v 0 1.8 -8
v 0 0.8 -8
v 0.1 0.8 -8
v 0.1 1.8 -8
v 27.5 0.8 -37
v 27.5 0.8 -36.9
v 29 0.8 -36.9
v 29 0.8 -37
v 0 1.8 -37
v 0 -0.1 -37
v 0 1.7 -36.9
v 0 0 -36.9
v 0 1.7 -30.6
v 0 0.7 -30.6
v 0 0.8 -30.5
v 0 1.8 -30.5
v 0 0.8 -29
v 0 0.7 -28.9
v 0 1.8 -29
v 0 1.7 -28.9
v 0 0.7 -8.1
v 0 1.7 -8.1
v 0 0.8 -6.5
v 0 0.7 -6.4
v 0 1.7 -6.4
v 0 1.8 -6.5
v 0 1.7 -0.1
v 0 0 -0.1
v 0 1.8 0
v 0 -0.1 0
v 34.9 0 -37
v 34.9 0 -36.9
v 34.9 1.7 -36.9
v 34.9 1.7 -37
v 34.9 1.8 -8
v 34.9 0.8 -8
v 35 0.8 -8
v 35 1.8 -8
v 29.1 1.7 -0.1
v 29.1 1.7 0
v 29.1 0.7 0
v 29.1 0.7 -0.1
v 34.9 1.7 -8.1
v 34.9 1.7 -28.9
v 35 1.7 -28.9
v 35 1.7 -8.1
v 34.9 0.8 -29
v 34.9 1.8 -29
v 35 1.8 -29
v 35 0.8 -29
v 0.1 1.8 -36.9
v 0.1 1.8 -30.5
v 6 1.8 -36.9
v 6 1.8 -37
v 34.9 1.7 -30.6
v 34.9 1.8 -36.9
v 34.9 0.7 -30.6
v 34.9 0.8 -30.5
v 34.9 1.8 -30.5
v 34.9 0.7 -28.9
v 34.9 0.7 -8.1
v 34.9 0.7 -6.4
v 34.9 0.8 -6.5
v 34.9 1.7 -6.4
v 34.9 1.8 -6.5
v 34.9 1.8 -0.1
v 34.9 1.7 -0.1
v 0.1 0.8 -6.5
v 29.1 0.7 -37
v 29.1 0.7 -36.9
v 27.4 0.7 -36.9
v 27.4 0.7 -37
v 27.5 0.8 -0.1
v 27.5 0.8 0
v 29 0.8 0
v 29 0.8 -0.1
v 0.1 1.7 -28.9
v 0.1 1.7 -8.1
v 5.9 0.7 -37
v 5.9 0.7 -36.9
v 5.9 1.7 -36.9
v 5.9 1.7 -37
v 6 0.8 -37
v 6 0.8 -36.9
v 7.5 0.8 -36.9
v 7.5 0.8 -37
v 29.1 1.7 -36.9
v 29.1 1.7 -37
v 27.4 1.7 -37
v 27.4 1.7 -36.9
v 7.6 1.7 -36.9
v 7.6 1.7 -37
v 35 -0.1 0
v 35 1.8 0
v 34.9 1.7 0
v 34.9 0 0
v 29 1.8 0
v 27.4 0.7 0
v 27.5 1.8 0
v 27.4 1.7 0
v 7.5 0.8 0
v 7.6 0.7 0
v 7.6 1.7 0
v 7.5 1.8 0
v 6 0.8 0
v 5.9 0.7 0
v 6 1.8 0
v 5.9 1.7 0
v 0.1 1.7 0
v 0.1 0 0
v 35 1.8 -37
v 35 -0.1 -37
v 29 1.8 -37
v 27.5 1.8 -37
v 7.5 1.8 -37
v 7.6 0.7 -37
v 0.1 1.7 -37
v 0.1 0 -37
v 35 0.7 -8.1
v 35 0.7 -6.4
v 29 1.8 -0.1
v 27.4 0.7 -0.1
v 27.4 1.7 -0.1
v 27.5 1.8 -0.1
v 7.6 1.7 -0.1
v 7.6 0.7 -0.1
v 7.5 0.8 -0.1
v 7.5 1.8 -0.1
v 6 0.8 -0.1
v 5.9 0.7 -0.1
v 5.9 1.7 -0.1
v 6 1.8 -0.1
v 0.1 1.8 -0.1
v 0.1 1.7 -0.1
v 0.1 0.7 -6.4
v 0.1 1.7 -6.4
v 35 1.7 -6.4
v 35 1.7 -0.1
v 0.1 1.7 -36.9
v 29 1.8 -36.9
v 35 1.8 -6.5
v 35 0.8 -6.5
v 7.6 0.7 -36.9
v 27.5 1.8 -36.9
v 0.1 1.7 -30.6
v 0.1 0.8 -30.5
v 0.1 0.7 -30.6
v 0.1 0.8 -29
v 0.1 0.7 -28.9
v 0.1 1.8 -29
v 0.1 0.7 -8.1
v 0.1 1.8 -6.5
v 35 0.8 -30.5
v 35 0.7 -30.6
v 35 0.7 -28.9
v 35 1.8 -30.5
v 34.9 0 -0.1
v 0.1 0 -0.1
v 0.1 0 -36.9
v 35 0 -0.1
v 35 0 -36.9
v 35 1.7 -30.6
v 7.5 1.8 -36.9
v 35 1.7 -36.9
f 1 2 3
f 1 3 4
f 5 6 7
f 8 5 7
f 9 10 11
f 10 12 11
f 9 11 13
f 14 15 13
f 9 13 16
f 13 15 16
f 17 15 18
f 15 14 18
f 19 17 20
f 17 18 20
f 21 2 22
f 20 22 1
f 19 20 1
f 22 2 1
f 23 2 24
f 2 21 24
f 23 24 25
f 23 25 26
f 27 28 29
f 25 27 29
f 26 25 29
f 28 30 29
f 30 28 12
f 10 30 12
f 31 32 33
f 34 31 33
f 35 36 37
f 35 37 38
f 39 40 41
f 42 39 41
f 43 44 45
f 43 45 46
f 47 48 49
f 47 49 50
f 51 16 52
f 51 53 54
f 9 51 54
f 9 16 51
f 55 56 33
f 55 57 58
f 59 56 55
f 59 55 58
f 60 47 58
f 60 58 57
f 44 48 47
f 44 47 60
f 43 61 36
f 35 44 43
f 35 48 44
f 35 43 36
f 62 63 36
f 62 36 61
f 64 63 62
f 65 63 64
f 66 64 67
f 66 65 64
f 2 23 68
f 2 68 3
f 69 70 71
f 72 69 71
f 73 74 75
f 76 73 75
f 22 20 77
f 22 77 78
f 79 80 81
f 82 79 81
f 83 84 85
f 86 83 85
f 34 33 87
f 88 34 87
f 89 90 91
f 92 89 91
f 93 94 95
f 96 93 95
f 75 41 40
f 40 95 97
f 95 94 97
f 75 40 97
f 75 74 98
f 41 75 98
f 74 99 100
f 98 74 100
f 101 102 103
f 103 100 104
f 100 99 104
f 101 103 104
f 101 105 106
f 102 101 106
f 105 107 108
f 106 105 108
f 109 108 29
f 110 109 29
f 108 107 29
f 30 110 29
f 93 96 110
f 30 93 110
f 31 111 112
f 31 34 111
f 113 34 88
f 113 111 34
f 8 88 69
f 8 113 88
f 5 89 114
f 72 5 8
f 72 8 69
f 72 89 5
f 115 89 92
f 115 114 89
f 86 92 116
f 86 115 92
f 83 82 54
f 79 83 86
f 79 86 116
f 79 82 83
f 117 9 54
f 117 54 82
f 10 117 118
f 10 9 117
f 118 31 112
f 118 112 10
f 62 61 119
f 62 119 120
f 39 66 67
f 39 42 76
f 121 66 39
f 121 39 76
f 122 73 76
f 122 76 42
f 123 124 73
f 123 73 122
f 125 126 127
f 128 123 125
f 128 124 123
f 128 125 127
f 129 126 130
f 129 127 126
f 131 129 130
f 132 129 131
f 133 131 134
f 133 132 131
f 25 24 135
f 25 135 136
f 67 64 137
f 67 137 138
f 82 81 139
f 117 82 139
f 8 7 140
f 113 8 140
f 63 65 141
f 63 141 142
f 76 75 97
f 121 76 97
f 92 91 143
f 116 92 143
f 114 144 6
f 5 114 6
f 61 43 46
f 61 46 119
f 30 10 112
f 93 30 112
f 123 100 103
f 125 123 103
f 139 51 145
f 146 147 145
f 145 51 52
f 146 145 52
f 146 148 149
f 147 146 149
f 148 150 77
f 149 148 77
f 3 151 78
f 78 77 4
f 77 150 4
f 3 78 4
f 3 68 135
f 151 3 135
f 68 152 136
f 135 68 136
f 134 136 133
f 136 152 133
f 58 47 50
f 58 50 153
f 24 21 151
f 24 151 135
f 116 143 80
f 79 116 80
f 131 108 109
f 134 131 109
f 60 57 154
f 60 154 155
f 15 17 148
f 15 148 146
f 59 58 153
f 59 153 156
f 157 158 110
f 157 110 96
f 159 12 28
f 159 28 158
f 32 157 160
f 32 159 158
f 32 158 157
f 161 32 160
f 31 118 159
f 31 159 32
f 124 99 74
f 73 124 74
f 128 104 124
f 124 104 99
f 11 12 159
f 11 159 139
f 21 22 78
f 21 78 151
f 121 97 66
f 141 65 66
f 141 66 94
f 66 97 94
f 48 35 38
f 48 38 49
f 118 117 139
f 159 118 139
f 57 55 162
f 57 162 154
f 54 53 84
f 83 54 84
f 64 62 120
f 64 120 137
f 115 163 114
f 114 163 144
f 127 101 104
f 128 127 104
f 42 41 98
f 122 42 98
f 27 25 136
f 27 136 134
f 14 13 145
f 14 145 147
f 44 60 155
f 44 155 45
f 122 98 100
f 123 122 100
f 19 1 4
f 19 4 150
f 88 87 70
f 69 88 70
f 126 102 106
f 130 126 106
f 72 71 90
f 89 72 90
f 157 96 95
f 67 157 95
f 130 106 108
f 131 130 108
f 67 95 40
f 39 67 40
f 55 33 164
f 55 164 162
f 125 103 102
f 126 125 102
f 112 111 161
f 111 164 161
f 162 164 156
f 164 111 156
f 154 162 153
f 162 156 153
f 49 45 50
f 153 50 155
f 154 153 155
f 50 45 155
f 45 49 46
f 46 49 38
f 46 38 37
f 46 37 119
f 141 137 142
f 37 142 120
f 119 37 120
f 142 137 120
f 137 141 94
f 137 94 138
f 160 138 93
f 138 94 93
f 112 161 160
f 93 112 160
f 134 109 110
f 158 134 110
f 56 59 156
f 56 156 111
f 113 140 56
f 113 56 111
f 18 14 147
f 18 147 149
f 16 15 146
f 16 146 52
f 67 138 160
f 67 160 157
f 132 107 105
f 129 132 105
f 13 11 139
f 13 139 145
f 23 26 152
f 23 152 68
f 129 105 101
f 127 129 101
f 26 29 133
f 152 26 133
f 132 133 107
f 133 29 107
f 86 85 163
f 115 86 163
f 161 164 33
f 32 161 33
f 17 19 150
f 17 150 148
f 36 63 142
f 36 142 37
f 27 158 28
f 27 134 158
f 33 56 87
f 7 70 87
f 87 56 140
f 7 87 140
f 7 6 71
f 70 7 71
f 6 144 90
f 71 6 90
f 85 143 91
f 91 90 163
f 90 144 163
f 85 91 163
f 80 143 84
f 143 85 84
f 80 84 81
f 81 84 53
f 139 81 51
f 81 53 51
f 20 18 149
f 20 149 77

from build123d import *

# Parameters (mm, degrees)
SKETCH_1_W             = 35
SKETCH_1_H             = 37
EXTRUDE_1_DEPTH        = 0.1
EXTRUDE_2_DEPTH        = 0.1
EXTRUDE_3_DEPTH        = 0.1
PATTERN_LINEAR_1_COUNT = 2
PATTERN_LINEAR_1_PITCH = 36.9
PATTERN_LINEAR_2_COUNT = 2
PATTERN_LINEAR_2_PITCH = 34.9


with BuildPart() as part:
    # 草图1 → 凸台-拉伸1 (new body)
    with BuildSketch(Plane(origin=(0, 0, 0), x_dir=(1, 0, 0), z_dir=(0, 1, 0))):
        with Locations((17.5, 18.5)):
            Rectangle(SKETCH_1_W, SKETCH_1_H)
    extrude(amount=-EXTRUDE_1_DEPTH)

    # 草图2 → 拉伸-薄壁2 (add)
    with BuildSketch(Plane.XY):
        Polygon((0, 0), (0, 1.8), (6, 1.8), (6, 0.8), (7.5, 0.8), (7.5, 1.8), (27.5, 1.8), (27.5, 0.8), (29, 0.8), (29, 1.8), (35, 1.8), (35, 0), (34.9, 0), (34.9, 1.7), (29.1, 1.7), (29.1, 0.7), (27.4, 0.7), (27.4, 1.7), (7.6, 1.7), (7.6, 0.7), (5.9, 0.7), (5.9, 1.7), (0.1, 1.7), (0.1, 0), align=None)
    extrude_2 = extrude(amount=-EXTRUDE_2_DEPTH)

    # 草图3 → 拉伸-薄壁3 (add)
    with BuildSketch(Plane(origin=(0, 0, 0), x_dir=(0, 0, -1), z_dir=(1, 0, 0))):
        Polygon((0, 1.8), (6.5, 1.8), (6.5, 0.8), (8, 0.8), (8, 1.8), (29, 1.8), (29, 0.8), (30.5, 0.8), (30.5, 1.8), (37, 1.8), (37, 0), (36.9, 0), (36.9, 1.7), (30.6, 1.7), (30.6, 0.7), (28.9, 0.7), (28.9, 1.7), (8.1, 1.7), (8.1, 0.7), (6.4, 0.7), (6.4, 1.7), (0, 1.7), align=None)
    extrude_3 = extrude(amount=EXTRUDE_3_DEPTH)

    # 阵列(线性)1: 拉伸-薄壁2 ×2
    with Locations(*[(0, 0, -i * PATTERN_LINEAR_1_PITCH) for i in range(1, PATTERN_LINEAR_1_COUNT)]):
        add(extrude_2)

    # 阵列(线性)2: 拉伸-薄壁3 ×2
    with Locations(*[(i * PATTERN_LINEAR_2_PITCH, 0, 0) for i in range(1, PATTERN_LINEAR_2_COUNT)]):
        add(extrude_3)


solid = part.part
